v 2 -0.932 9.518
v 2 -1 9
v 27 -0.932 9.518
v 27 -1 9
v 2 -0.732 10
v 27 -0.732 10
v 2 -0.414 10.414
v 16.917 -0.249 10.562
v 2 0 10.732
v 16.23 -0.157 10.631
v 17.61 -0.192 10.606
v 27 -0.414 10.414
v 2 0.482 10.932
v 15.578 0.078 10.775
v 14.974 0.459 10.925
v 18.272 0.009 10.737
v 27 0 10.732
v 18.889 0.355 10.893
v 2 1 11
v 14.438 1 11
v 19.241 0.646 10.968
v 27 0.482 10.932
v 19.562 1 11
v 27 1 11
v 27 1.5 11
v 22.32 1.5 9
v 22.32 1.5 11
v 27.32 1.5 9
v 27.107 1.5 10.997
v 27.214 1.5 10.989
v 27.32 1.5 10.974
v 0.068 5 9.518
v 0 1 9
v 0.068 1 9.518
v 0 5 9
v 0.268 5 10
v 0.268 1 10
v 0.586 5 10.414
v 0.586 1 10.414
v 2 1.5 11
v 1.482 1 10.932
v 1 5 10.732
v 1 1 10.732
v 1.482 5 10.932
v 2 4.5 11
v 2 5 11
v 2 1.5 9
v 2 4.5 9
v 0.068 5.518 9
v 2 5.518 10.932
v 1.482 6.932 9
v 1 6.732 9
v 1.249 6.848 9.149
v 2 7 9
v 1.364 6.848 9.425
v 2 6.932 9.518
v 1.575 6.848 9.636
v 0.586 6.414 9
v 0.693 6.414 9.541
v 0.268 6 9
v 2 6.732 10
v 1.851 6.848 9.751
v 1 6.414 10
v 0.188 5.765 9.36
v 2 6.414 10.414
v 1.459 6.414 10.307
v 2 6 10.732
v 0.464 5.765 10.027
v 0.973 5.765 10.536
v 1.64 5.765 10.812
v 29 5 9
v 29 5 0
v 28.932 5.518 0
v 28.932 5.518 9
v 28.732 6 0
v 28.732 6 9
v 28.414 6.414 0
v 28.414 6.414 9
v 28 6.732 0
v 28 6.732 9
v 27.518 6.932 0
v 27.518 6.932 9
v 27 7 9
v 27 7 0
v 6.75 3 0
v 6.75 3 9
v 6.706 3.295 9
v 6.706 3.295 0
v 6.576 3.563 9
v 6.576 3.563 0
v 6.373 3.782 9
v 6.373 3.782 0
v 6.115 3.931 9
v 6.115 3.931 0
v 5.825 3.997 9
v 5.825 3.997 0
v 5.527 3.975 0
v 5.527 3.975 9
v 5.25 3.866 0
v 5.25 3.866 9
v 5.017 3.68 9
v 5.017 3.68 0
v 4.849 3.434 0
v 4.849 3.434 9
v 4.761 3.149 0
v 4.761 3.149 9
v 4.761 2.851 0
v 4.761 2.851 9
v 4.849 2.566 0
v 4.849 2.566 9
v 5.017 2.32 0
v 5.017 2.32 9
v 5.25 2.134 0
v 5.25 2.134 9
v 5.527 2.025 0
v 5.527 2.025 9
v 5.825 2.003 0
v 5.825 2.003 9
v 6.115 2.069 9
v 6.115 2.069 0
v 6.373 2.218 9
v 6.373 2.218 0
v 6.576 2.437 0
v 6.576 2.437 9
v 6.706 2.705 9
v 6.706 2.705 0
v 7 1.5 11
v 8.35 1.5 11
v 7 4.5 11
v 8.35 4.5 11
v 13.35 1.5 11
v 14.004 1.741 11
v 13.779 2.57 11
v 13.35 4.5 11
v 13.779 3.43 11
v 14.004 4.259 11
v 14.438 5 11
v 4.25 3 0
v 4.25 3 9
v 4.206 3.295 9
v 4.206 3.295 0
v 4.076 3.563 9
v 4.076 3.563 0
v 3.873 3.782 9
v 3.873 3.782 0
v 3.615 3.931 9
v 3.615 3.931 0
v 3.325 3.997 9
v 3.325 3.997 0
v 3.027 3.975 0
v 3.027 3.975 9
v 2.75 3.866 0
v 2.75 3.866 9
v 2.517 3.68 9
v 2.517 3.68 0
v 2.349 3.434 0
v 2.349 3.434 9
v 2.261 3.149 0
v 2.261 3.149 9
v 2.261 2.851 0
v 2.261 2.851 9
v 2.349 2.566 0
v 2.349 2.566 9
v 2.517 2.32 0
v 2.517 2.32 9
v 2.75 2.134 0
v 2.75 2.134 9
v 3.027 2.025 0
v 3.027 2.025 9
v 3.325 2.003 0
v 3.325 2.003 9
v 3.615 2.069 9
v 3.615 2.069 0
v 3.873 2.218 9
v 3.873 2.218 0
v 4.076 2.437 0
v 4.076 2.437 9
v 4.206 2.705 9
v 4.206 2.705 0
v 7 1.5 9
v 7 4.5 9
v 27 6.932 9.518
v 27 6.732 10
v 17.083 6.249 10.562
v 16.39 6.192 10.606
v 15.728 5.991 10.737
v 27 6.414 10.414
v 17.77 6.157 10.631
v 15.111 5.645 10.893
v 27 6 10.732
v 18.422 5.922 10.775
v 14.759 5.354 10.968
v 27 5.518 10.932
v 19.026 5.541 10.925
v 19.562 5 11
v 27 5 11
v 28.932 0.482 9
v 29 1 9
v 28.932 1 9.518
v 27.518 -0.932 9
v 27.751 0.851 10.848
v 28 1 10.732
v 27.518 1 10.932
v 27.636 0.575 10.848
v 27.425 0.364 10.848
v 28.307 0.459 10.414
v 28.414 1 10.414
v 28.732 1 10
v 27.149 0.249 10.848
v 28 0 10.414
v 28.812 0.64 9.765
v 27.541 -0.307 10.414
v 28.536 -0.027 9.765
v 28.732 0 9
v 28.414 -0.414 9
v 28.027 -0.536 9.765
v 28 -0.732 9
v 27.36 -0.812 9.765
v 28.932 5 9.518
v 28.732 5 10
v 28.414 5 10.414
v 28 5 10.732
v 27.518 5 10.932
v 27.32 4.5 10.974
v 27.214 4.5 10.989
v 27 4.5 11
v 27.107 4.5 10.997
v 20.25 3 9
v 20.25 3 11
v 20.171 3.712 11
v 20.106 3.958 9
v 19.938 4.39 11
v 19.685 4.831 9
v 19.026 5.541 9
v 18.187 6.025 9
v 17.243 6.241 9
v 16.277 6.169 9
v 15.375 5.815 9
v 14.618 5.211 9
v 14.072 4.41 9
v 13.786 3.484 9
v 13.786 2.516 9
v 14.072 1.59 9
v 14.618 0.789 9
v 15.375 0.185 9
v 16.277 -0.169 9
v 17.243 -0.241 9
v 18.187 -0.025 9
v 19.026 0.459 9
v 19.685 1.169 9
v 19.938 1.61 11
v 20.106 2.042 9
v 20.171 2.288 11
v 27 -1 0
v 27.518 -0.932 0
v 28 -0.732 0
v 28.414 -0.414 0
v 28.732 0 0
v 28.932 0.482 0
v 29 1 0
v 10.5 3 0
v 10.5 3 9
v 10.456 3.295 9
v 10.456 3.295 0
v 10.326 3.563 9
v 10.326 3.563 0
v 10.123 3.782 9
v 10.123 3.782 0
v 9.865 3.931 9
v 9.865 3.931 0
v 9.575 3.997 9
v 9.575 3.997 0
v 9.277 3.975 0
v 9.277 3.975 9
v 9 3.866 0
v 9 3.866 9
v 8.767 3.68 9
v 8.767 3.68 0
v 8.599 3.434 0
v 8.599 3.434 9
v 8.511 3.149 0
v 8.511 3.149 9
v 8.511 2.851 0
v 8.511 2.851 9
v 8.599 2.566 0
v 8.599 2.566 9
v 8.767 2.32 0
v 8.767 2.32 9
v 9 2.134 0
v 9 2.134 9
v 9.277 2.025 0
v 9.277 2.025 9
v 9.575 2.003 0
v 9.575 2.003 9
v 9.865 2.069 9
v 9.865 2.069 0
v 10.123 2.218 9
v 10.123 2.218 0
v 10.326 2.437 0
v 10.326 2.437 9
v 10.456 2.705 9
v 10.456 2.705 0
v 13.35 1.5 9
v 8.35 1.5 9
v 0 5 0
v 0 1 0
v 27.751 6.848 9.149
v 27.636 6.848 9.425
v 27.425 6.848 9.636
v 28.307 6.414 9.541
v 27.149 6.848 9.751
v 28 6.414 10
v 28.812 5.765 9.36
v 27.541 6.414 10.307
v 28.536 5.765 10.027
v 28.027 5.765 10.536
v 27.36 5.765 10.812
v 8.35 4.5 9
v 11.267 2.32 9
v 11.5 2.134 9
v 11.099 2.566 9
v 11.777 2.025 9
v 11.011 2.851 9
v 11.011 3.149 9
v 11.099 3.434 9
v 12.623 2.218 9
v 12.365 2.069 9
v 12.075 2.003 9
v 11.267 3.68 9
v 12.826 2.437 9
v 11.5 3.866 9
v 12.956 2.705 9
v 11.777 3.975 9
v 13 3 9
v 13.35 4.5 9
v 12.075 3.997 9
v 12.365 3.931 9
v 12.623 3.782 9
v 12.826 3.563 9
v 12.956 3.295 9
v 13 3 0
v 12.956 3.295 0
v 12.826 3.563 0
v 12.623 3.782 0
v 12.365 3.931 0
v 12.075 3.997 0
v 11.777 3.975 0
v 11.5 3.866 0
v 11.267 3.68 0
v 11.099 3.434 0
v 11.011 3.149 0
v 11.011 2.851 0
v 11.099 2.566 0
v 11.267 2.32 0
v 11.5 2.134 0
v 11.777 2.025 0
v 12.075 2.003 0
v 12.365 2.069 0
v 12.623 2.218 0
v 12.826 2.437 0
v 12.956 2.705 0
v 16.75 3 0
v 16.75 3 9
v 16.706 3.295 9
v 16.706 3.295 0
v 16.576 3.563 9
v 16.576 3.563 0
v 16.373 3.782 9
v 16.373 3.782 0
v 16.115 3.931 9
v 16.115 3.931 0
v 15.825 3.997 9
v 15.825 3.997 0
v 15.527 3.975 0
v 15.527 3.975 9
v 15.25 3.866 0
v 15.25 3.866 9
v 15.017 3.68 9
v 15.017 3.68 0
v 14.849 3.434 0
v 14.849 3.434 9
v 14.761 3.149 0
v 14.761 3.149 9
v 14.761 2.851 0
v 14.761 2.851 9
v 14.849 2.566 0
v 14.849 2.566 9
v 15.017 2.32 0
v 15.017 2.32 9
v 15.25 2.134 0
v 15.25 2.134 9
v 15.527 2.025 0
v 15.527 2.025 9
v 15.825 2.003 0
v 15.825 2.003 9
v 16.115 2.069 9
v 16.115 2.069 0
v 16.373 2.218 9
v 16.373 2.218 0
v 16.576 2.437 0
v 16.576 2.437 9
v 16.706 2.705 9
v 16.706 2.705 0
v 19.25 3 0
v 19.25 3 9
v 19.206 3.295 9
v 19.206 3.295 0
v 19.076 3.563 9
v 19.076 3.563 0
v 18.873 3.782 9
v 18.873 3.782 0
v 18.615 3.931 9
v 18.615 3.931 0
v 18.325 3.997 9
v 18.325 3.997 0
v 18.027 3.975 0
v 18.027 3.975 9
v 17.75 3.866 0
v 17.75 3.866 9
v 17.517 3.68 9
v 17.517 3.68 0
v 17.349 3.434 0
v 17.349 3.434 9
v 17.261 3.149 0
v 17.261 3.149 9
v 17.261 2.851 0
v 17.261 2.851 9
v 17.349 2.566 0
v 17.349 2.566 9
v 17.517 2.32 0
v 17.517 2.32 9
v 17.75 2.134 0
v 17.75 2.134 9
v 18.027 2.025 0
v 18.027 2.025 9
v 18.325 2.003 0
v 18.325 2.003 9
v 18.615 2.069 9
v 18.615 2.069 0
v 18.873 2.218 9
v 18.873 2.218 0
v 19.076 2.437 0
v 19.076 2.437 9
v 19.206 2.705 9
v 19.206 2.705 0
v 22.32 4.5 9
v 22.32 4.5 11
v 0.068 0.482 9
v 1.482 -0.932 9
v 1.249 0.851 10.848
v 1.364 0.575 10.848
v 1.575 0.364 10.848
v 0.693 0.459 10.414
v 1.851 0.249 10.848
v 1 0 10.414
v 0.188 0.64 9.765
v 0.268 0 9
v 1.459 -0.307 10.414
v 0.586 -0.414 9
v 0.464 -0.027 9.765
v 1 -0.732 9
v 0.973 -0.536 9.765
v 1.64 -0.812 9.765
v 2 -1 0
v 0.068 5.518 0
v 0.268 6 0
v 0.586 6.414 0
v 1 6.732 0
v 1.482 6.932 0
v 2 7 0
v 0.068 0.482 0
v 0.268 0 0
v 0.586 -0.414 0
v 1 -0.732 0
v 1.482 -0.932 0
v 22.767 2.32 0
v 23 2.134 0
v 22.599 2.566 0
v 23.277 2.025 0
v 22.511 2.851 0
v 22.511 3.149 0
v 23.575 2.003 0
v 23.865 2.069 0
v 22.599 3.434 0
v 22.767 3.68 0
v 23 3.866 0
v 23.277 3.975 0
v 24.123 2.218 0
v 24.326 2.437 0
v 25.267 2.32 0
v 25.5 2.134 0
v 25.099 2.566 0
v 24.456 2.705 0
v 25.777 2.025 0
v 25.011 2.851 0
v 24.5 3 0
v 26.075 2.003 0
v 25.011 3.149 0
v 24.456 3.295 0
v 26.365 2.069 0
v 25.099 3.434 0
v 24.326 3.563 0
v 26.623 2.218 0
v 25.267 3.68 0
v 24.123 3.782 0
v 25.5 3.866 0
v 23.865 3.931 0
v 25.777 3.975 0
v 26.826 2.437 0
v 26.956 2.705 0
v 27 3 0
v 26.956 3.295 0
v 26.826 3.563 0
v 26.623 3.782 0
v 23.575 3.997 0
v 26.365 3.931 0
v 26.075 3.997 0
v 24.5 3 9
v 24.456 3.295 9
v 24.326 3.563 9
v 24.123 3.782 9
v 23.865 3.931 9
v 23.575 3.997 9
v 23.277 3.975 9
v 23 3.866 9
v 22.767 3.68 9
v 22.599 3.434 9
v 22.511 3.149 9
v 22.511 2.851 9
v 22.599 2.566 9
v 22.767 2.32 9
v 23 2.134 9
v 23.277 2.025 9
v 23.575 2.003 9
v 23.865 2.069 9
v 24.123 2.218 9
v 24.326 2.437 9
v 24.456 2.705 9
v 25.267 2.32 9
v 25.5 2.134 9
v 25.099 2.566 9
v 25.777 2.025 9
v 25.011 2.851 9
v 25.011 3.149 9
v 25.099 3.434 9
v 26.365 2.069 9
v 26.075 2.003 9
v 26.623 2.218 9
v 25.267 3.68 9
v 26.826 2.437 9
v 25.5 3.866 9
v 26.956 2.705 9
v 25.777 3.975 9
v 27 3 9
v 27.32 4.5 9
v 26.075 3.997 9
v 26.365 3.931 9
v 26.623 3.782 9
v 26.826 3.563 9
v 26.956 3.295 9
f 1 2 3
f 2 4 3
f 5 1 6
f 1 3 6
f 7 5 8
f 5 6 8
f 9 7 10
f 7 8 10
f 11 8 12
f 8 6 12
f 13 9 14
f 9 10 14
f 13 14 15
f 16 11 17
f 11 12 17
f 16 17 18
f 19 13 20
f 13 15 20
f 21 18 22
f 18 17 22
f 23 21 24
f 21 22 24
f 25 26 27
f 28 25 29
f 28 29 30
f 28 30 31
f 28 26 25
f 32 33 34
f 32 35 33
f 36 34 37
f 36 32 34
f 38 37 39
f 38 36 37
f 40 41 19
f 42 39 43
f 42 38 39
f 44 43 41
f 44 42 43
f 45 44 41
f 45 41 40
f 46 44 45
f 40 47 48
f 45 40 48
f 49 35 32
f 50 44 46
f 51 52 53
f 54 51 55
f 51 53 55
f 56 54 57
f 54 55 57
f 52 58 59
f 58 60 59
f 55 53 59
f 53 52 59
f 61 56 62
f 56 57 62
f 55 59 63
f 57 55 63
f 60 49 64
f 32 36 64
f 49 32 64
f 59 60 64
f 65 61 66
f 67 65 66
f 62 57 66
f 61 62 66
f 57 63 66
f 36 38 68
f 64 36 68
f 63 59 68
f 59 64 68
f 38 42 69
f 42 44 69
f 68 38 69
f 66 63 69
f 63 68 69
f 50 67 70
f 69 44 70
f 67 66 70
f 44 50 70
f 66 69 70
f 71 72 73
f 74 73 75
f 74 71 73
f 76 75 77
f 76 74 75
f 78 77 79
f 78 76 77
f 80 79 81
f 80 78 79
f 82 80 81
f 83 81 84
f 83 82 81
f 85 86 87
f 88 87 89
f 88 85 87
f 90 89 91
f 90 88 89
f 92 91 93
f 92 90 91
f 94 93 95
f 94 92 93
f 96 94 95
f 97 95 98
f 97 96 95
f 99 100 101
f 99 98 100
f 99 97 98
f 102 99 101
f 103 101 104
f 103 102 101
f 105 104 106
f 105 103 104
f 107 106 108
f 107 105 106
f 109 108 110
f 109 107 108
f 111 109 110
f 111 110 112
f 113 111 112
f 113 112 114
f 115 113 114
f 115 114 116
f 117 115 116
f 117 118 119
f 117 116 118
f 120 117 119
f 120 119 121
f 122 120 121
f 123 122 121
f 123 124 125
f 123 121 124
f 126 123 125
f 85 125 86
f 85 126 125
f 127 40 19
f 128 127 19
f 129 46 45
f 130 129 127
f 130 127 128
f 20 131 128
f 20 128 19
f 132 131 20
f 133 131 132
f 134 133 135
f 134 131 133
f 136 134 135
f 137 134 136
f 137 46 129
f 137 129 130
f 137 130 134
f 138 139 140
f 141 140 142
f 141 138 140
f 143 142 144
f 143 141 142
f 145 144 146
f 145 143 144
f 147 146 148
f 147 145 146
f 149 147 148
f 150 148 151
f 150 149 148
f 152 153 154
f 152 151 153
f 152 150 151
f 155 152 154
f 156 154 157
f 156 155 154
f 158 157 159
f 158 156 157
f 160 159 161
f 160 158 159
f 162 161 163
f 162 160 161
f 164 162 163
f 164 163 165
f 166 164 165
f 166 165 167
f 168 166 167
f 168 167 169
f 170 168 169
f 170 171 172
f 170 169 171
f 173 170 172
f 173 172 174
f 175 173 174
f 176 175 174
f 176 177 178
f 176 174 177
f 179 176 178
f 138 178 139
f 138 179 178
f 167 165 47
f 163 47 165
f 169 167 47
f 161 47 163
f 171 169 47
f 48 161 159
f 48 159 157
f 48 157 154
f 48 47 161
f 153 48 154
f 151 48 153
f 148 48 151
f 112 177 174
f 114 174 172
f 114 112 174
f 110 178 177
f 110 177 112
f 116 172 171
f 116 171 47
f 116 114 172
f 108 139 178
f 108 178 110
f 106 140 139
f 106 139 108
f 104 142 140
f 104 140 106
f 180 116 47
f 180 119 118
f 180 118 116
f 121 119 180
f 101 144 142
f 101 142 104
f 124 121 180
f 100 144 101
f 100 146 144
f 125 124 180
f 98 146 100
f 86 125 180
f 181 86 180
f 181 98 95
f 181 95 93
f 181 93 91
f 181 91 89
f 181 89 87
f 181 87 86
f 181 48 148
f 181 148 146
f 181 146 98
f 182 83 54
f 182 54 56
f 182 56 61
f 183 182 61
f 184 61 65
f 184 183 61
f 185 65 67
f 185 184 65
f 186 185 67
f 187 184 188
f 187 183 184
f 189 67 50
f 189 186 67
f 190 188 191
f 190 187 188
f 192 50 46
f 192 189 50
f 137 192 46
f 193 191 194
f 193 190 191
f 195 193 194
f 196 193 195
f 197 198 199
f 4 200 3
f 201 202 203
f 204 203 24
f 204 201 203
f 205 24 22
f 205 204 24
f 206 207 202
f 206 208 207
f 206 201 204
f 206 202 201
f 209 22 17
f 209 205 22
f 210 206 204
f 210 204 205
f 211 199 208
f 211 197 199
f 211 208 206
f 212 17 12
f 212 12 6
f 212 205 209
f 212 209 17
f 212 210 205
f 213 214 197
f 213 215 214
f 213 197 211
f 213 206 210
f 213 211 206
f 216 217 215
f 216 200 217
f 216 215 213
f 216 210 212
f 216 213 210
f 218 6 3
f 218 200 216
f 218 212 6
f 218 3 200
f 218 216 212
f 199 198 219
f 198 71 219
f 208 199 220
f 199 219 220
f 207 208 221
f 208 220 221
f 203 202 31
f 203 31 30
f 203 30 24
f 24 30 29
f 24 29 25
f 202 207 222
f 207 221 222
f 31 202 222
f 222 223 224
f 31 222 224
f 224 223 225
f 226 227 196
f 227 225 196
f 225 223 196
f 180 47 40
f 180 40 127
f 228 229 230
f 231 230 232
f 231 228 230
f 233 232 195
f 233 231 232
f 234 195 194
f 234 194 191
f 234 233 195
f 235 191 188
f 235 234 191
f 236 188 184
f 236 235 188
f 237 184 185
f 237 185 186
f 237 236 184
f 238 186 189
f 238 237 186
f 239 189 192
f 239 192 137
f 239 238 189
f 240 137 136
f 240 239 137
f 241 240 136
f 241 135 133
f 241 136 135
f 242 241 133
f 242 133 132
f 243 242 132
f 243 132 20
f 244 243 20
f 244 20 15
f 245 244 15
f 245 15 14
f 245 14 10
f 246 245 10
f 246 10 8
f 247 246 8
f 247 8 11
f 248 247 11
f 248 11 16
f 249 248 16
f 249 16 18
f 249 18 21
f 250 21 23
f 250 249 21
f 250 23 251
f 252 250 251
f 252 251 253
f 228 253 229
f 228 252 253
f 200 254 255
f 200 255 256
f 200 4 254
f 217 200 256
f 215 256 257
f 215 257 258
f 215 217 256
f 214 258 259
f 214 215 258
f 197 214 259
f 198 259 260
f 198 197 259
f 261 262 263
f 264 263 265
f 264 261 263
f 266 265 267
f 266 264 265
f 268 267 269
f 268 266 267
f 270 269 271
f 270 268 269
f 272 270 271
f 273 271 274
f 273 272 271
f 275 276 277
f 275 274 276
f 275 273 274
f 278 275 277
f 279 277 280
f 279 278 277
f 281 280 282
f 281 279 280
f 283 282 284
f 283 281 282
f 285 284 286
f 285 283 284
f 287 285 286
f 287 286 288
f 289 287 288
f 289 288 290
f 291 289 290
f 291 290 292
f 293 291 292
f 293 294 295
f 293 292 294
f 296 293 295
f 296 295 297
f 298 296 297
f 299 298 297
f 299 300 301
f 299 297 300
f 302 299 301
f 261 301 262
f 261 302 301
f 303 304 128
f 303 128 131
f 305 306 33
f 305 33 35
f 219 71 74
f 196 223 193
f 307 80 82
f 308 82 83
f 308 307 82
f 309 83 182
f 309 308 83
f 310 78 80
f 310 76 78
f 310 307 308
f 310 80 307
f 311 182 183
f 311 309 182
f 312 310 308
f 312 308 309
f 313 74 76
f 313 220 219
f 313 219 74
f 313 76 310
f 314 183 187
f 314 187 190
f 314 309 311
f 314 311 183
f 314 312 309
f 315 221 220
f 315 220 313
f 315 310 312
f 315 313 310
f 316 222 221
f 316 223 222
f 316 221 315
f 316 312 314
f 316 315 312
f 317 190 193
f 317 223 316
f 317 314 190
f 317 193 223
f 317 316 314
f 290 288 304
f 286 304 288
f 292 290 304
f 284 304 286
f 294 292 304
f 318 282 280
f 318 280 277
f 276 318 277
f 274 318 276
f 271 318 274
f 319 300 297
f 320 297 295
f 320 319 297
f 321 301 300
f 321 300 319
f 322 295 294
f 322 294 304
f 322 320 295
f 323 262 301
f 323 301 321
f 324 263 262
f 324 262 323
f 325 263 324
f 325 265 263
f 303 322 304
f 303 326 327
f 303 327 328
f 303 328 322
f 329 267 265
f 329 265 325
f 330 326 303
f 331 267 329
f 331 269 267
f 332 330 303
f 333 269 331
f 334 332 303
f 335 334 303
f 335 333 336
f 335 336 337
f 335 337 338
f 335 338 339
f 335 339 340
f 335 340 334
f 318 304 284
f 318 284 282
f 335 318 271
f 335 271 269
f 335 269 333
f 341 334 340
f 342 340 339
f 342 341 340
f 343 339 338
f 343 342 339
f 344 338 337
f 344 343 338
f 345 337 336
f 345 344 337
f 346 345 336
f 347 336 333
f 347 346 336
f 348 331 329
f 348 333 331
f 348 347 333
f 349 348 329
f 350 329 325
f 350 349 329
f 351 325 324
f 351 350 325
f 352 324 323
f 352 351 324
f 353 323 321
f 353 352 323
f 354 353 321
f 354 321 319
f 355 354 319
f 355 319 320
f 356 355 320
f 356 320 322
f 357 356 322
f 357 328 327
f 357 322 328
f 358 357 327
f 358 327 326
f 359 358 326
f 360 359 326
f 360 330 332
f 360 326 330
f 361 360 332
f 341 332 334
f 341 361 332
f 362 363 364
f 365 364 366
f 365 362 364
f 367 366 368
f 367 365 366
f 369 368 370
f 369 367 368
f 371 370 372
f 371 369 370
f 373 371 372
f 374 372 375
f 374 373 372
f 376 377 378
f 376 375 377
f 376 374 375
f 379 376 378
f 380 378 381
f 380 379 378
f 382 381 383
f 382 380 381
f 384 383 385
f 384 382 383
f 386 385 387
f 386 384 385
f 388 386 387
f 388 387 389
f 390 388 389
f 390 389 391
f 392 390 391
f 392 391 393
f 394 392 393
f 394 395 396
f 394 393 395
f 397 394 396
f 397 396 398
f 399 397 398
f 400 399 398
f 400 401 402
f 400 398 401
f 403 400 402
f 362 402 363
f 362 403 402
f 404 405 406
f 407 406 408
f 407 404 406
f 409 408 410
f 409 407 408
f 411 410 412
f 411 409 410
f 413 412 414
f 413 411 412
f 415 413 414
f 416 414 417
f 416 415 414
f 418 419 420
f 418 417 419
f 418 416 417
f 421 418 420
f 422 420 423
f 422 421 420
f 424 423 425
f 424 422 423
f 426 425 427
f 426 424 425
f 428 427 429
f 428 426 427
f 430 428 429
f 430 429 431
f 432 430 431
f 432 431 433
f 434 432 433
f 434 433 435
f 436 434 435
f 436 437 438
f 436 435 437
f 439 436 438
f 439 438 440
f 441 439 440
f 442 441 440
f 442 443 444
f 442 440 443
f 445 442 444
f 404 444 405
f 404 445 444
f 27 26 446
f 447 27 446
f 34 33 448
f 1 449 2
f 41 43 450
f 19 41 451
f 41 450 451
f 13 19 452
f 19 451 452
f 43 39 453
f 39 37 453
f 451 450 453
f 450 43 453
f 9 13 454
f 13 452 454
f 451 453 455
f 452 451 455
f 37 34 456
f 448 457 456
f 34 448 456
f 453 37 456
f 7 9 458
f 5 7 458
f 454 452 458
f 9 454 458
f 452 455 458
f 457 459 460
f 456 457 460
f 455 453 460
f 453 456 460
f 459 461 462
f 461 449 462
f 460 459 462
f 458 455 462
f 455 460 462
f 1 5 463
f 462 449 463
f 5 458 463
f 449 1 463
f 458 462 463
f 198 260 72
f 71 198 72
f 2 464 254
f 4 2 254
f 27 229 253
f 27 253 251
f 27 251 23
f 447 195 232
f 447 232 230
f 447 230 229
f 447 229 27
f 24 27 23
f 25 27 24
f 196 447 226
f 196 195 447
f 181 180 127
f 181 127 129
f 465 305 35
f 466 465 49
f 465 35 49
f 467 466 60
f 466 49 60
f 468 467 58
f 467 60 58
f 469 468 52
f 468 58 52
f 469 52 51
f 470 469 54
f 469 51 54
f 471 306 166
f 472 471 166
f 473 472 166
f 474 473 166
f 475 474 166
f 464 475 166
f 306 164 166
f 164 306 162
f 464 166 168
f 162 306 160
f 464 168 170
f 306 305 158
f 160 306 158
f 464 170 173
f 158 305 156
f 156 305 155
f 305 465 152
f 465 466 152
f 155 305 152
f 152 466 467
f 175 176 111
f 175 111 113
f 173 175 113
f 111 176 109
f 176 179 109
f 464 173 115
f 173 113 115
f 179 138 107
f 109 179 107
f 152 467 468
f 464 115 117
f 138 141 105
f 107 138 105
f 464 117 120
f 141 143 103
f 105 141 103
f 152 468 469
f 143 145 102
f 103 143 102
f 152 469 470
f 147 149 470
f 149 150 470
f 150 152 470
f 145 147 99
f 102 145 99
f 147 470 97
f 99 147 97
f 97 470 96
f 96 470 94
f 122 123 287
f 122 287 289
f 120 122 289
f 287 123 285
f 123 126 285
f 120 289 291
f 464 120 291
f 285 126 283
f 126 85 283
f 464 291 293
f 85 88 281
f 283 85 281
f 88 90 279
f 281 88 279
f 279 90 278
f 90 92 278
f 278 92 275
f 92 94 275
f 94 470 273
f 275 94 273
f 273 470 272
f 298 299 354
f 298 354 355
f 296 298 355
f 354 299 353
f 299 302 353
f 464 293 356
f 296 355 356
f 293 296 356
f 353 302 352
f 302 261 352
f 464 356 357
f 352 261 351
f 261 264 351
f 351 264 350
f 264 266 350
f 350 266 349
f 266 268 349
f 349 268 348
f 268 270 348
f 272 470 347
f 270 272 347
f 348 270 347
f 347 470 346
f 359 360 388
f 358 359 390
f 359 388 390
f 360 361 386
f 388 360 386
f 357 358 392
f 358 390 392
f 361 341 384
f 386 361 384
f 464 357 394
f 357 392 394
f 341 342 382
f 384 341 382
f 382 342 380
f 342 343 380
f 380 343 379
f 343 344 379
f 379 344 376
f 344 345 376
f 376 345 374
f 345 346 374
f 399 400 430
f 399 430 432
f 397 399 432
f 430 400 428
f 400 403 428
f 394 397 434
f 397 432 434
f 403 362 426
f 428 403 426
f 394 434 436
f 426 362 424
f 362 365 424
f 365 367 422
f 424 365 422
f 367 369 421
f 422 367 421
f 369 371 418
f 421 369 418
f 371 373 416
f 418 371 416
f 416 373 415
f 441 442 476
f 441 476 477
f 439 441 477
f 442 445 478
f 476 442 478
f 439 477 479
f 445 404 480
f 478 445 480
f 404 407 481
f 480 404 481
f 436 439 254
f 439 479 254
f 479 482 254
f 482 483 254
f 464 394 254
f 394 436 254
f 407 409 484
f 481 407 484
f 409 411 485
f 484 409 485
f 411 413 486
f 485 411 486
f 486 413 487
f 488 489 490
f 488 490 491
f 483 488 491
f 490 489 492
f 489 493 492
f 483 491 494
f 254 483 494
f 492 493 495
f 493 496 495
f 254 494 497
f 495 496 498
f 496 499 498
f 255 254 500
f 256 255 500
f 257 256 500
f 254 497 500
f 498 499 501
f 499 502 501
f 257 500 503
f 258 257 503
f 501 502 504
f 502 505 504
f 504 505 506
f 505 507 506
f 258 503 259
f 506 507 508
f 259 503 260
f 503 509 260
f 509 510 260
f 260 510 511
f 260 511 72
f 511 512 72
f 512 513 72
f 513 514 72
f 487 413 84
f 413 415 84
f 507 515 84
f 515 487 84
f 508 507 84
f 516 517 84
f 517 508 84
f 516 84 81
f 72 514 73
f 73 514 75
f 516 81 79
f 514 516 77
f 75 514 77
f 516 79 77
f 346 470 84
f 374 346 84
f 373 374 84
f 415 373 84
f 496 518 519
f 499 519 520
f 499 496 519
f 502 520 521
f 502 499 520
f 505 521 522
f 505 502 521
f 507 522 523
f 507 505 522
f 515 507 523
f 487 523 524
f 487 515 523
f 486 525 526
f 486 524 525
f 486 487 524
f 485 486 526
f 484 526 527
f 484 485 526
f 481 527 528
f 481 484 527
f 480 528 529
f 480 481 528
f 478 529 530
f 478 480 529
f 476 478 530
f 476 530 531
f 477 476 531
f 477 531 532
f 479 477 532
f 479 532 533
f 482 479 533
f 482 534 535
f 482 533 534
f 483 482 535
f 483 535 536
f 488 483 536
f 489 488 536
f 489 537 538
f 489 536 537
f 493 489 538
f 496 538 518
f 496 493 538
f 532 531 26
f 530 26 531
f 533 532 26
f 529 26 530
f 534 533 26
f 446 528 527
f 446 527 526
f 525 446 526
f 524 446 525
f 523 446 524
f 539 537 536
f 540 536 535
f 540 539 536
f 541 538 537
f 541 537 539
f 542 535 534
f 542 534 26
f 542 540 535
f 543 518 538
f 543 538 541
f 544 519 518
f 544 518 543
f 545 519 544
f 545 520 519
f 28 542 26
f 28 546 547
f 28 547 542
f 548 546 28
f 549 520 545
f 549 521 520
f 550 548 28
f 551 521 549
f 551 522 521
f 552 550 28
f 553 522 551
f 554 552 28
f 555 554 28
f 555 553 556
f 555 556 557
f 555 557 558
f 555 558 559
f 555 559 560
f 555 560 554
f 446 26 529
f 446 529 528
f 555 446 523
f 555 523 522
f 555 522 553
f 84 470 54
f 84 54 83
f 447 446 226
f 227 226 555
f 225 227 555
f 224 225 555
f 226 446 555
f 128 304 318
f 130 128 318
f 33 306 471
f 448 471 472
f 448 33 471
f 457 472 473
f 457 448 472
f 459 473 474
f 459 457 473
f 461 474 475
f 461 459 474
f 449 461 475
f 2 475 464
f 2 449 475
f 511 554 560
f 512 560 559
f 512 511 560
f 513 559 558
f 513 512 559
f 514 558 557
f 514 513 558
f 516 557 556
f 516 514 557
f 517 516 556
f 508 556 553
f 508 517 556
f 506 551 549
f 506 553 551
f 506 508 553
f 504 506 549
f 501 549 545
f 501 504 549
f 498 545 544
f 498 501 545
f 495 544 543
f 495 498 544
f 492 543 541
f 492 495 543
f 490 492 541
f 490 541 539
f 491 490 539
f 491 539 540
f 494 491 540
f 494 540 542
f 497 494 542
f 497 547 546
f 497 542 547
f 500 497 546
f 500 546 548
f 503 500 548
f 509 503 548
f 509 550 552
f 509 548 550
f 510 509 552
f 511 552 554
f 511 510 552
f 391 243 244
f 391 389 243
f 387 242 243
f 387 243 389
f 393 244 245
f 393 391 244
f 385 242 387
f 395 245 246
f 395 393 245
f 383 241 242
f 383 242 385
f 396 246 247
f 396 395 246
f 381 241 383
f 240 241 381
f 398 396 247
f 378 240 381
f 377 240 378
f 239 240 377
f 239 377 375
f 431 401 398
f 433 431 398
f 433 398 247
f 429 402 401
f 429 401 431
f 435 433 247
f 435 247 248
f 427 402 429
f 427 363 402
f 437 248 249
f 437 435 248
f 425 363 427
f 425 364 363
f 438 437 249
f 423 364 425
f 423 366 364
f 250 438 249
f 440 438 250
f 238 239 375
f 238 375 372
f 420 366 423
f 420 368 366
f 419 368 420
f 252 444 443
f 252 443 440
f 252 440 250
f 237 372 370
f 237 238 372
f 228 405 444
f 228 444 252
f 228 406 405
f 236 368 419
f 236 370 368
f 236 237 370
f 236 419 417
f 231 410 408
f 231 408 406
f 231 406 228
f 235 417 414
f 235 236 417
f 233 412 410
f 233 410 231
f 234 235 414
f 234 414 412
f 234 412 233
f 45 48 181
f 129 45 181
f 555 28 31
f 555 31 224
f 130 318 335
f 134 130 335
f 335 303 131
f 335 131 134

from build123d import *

# Parameters (mm, degrees)
BOX001_W          = 5
BOX001_H          = 3
BOX001_DEPTH      = 10
BOX002_W          = 5
BOX002_H          = 3
BOX002_DEPTH      = 10
BOX003_W          = 5
BOX003_H          = 3
BOX003_DEPTH      = 10
CYLINDER_R        = 3.25
CYLINDER_DEPTH    = 10
CYLINDER002_R     = 1
CYLINDER002_DEPTH = 20
CYLINDER001_R     = 1
CYLINDER001_DEPTH = 20
CYLINDER004_R     = 1
CYLINDER004_DEPTH = 20
CYLINDER003_R     = 1
CYLINDER003_DEPTH = 20
CYLINDER006_R     = 1
CYLINDER006_DEPTH = 20
CYLINDER005_R     = 1
CYLINDER005_DEPTH = 20
CYLINDER008_R     = 1
CYLINDER008_DEPTH = 20
CYLINDER007_R     = 1
CYLINDER007_DEPTH = 20
BOX_W             = 29
BOX_H             = 8
BOX_DEPTH         = 11
FILLET_R          = 2


with BuildPart() as cube001:
    # Box001 → Box001 (new body)
    with BuildSketch(Plane(origin=(2, 1.5, 9), x_dir=(1, 0, 0), z_dir=(0, 0, 1))):
        with Locations((2.5, 1.5)):
            Rectangle(BOX001_W, BOX001_H)
    extrude(amount=BOX001_DEPTH)


with BuildPart() as cube002:
    # Box002 → Box002 (new body)
    with BuildSketch(Plane(origin=(8.35, 1.5, 9), x_dir=(1, 0, 0), z_dir=(0, 0, 1))):
        with Locations((2.5, 1.5)):
            Rectangle(BOX002_W, BOX002_H)
    extrude(amount=BOX002_DEPTH)


with BuildPart() as cube003:
    # Box003 → Box003 (new body)
    with BuildSketch(Plane(origin=(22.32, 1.5, 9), x_dir=(1, 0, 0), z_dir=(0, 0, 1))):
        with Locations((2.5, 1.5)):
            Rectangle(BOX003_W, BOX003_H)
    extrude(amount=BOX003_DEPTH)


with BuildPart() as cylinder:
    # Cylinder → Cylinder (new body)
    with BuildSketch(Plane(origin=(17, 3, 9), x_dir=(1, 0, 0), z_dir=(0, 0, 1))):
        Circle(CYLINDER_R)
    extrude(amount=CYLINDER_DEPTH)


with BuildPart() as cylinder002:
    # Cylinder002 → Cylinder002 (new body)
    with BuildSketch(Plane(origin=(5.75, 3, 0), x_dir=(1, 0, 0), z_dir=(0, 0, 1))):
        Circle(CYLINDER002_R)
    extrude(amount=CYLINDER002_DEPTH)


with BuildPart() as fusion:
    # Cylinder001 → Cylinder001 (new body)
    with BuildSketch(Plane(origin=(3.25, 3, 0), x_dir=(1, 0, 0), z_dir=(0, 0, 1))):
        Circle(CYLINDER001_R)
    extrude(amount=CYLINDER001_DEPTH)

    # Fusion: union Cylinder002
    add(cylinder002.part)


with BuildPart() as cylinder004:
    # Cylinder004 → Cylinder004 (new body)
    with BuildSketch(Plane(origin=(5.75, 3, 0), x_dir=(1, 0, 0), z_dir=(0, 0, 1))):
        Circle(CYLINDER004_R)
    extrude(amount=CYLINDER004_DEPTH)


with BuildPart() as fusion001:
    # Cylinder003 → Cylinder003 (new body)
    with BuildSketch(Plane(origin=(3.25, 3, 0), x_dir=(1, 0, 0), z_dir=(0, 0, 1))):
        Circle(CYLINDER003_R)
    extrude(amount=CYLINDER003_DEPTH)

    # Fusion001: union Cylinder004
    add(cylinder004.part)


with BuildPart() as fusion001_1:
    # Fusion001 placement: moved
    add(fusion001.part.moved(Location((6.25, 0, 0))))


with BuildPart() as cylinder006:
    # Cylinder006 → Cylinder006 (new body)
    with BuildSketch(Plane(origin=(5.75, 3, 0), x_dir=(1, 0, 0), z_dir=(0, 0, 1))):
        Circle(CYLINDER006_R)
    extrude(amount=CYLINDER006_DEPTH)


with BuildPart() as fusion002:
    # Cylinder005 → Cylinder005 (new body)
    with BuildSketch(Plane(origin=(3.25, 3, 0), x_dir=(1, 0, 0), z_dir=(0, 0, 1))):
        Circle(CYLINDER005_R)
    extrude(amount=CYLINDER005_DEPTH)

    # Fusion002: union Cylinder006
    add(cylinder006.part)


with BuildPart() as fusion002_1:
    # Fusion002 placement: moved
    add(fusion002.part.moved(Location((20.25, 0, 0))))


with BuildPart() as cylinder008:
    # Cylinder008 → Cylinder008 (new body)
    with BuildSketch(Plane(origin=(5.75, 3, 0), x_dir=(1, 0, 0), z_dir=(0, 0, 1))):
        Circle(CYLINDER008_R)
    extrude(amount=CYLINDER008_DEPTH)


with BuildPart() as fusion004:
    # Cylinder007 → Cylinder007 (new body)
    with BuildSketch(Plane(origin=(3.25, 3, 0), x_dir=(1, 0, 0), z_dir=(0, 0, 1))):
        Circle(CYLINDER007_R)
    extrude(amount=CYLINDER007_DEPTH)

    # Fusion003: union Cylinder008
    add(cylinder008.part)


with BuildPart() as fusion004_1:
    # Fusion003 placement: moved
    add(fusion004.part.moved(Location((12.5, 0, 0))))

    # Fusion004: union Cube001, Cube002, Cube003, Cylinder, Fusion, Fusion001, Fusion002
    add(cube001.part)
    add(cube002.part)
    add(cube003.part)
    add(cylinder.part)
    add(fusion.part)
    add(fusion001_1.part)
    add(fusion002_1.part)


with BuildPart() as standoff:
    # Box → Box (new body)
    with BuildSketch(Plane(origin=(0, -1, 0), x_dir=(1, 0, 0), z_dir=(0, 0, 1))):
        with Locations((14.5, 4)):
            Rectangle(BOX_W, BOX_H)
    extrude(amount=BOX_DEPTH)

    # Fillet
    fillet_edges = [standoff.edges().sort_by_distance(p)[0] for p in [
        (0, -1, 5.5),
        (0, 3, 11),
        (0, 7, 5.5),
        (29, -1, 5.5),
        (29, 3, 11),
        (29, 7, 5.5),
        (14.5, -1, 11),
        (14.5, 7, 11),
    ]]
    fillet(fillet_edges, radius=FILLET_R)

    # Cut: cut Fusion004
    add(fusion004_1.part, mode=Mode.SUBTRACT)


solid = standoff.part
